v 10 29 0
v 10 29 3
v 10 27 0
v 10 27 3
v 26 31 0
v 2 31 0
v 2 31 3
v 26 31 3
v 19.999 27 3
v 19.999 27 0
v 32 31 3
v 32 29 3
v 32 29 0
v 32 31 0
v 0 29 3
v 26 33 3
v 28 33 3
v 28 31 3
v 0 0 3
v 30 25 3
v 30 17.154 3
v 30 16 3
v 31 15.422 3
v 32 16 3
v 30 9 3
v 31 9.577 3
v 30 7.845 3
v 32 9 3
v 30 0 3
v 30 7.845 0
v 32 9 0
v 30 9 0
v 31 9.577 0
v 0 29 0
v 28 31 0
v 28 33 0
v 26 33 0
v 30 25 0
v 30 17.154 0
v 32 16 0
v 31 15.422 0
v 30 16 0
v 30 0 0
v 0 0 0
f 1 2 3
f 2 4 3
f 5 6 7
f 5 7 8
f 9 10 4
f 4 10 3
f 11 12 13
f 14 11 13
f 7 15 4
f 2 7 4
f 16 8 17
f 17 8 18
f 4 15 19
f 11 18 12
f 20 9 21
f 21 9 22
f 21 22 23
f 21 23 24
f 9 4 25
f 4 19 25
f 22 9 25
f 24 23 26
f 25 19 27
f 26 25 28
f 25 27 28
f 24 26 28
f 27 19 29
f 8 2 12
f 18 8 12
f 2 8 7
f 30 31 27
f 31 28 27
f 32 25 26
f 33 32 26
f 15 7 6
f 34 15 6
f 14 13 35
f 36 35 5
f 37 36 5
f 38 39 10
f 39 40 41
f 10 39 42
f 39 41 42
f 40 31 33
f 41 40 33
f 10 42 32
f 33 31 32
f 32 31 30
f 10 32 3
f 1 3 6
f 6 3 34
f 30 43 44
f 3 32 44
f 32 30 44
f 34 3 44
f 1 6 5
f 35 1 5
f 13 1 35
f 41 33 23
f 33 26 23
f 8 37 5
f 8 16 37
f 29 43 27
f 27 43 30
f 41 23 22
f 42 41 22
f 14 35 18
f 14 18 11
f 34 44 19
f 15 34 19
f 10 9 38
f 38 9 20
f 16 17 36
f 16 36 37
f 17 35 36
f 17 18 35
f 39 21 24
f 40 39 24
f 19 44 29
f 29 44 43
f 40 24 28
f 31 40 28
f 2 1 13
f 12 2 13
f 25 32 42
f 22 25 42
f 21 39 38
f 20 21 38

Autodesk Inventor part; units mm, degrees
ref_plane "YZ Plane" through (0, 0, 0) normal (1, 0, 0) x (0, 1, 0)
ref_plane "XZ Plane" through (0, 0, 0) normal (0, 1, 0) x (-1, 0, 0)
ref_plane "XY Plane" through (0, 0, 0) normal (0, 0, 1) x (1, 0, 0)
sketch "Sketch1" plane through (0, 0, 0) normal (0, 0, 1) x (1, 0, 0)
  line L0 (0, 0) -> (30, 0)
  line L1 (30, 0) -> (30, 27)
  line L2 (30, 27) -> (0, 27)
  line L3 (0, 27) -> (0, 0)
  dimension "d0" = 30
  dimension "d1" = 27
extrude "Extrusion1" add sketch "Sketch1" along normal blind 3
sketch "Sketch2" plane through (0, 27, 0) normal (0, 1, 0) x (1, 0, 0)
  line L0 (0, 0) -> (0, -3) projected
  line L1 (0, 0) -> (30, 0) projected
  line L2 (0, -3) -> (10, -3)
  line L3 (10, -3) -> (10, 0)
  line L4 (10, 0) -> (0, 0)
  line L5 (0, 0) -> (0, -3)
  dimension "d4" = 10
extrude "Extrusion2" add sketch "Sketch2" along normal blind 2
sketch "Sketch3" plane through (0, 29, 0) normal (0, 1, 0) x (1, 0, 0)
  line L0 (0, 0) -> (0, -3) projected
  line L1 (0, -3) -> (32, -3)
  line L2 (32, -3) -> (32, 0)
  line L3 (32, 0) -> (0, 0)
  line L4 (0, 0) -> (0, -3)
  point P0 (30, 0)
  dimension "d7" = 2
extrude "Extrusion3" add sketch "Sketch3" along normal blind 2
chamfer "Chamfer1" distance 2 angle 45 1 edges at (0, 31, 1.5)
sketch "Sketch4" plane through (0, 0, 3) normal (0, 0, 1) x (1, 0, 0)
  line L0 (32, 29) -> (10, 29) projected
  line L1 (10, 29) -> (30, 24.9996)
  line L2 (10, 27) -> (10, 29) projected
  line L3 (30.3923, 26.9608) -> (10, 29)
  line L4 (10, 29) -> (10.3923, 30.9612) construction
  line L5 (10.3923, 30.9612) -> (30.3923, 26.9608) construction
  line L6 (30, 0) -> (30, 27) projected
  line L7 (30, 24.9996) -> (30.3923, 26.9608)
  point P0 (0, 0)
  dimension "d35" = 2
  dimension "d36" = 2
extrude "Extrusion4" cut sketch "Sketch4" against normal through all contours L3 L6 L1
sketch "Sketch5" plane through (0, 0, 3) normal (0, 0, 1) x (1, 0, 0)
  line L0 (2, 31) -> (32, 31) projected
  line L1 (26, 31) -> (28, 31)
  line L2 (28, 31) -> (28, 33)
  line L3 (28, 33) -> (26, 33)
  line L4 (26, 33) -> (26, 31)
  line L5 (30, 0) -> (30, 24.9996) projected
  point P0 (0, 0)
  dimension "d16" = 2
  dimension "d17" = 2
  dimension "d18" = 2
extrude "Extrusion5" add sketch "Sketch5" against normal blind 3
sketch "Sketch6" plane through (0, 0, 3) normal (0, 0, 1) x (1, 0, 0)
  line L0 (30, 0) -> (30, 24.9996) projected
  line L1 (30, 17.1545) -> (32, 15.9998)
  line L2 (32, 15.9998) -> (32, 8.9998)
  line L3 (32, 8.9998) -> (30, 7.8451)
  line L4 (30, 8.9998) -> (31, 9.5772)
  line L5 (31, 9.5772) -> (31, 15.4225)
  line L6 (31, 15.4225) -> (30, 15.9998)
  line L7 (30, 7.8451) -> (30, 8.9998)
  line L8 (30, 17.1545) -> (30, 15.9998)
  point P0 (0, 0)
  point P1 (32, 12.4998)
  point P2 (30, 12.4998)
  dimension "d27" = 120
  dimension "d29" = 120
  dimension "d30" = 2
  dimension "d31" = 7
  dimension "d32" = 1
extrude "Extrusion6" add sketch "Sketch6" against normal blind 3 contours L0 L4 L5 L6 L1 L2 L3
properties part number "TA11" material "ABS Plastic"
